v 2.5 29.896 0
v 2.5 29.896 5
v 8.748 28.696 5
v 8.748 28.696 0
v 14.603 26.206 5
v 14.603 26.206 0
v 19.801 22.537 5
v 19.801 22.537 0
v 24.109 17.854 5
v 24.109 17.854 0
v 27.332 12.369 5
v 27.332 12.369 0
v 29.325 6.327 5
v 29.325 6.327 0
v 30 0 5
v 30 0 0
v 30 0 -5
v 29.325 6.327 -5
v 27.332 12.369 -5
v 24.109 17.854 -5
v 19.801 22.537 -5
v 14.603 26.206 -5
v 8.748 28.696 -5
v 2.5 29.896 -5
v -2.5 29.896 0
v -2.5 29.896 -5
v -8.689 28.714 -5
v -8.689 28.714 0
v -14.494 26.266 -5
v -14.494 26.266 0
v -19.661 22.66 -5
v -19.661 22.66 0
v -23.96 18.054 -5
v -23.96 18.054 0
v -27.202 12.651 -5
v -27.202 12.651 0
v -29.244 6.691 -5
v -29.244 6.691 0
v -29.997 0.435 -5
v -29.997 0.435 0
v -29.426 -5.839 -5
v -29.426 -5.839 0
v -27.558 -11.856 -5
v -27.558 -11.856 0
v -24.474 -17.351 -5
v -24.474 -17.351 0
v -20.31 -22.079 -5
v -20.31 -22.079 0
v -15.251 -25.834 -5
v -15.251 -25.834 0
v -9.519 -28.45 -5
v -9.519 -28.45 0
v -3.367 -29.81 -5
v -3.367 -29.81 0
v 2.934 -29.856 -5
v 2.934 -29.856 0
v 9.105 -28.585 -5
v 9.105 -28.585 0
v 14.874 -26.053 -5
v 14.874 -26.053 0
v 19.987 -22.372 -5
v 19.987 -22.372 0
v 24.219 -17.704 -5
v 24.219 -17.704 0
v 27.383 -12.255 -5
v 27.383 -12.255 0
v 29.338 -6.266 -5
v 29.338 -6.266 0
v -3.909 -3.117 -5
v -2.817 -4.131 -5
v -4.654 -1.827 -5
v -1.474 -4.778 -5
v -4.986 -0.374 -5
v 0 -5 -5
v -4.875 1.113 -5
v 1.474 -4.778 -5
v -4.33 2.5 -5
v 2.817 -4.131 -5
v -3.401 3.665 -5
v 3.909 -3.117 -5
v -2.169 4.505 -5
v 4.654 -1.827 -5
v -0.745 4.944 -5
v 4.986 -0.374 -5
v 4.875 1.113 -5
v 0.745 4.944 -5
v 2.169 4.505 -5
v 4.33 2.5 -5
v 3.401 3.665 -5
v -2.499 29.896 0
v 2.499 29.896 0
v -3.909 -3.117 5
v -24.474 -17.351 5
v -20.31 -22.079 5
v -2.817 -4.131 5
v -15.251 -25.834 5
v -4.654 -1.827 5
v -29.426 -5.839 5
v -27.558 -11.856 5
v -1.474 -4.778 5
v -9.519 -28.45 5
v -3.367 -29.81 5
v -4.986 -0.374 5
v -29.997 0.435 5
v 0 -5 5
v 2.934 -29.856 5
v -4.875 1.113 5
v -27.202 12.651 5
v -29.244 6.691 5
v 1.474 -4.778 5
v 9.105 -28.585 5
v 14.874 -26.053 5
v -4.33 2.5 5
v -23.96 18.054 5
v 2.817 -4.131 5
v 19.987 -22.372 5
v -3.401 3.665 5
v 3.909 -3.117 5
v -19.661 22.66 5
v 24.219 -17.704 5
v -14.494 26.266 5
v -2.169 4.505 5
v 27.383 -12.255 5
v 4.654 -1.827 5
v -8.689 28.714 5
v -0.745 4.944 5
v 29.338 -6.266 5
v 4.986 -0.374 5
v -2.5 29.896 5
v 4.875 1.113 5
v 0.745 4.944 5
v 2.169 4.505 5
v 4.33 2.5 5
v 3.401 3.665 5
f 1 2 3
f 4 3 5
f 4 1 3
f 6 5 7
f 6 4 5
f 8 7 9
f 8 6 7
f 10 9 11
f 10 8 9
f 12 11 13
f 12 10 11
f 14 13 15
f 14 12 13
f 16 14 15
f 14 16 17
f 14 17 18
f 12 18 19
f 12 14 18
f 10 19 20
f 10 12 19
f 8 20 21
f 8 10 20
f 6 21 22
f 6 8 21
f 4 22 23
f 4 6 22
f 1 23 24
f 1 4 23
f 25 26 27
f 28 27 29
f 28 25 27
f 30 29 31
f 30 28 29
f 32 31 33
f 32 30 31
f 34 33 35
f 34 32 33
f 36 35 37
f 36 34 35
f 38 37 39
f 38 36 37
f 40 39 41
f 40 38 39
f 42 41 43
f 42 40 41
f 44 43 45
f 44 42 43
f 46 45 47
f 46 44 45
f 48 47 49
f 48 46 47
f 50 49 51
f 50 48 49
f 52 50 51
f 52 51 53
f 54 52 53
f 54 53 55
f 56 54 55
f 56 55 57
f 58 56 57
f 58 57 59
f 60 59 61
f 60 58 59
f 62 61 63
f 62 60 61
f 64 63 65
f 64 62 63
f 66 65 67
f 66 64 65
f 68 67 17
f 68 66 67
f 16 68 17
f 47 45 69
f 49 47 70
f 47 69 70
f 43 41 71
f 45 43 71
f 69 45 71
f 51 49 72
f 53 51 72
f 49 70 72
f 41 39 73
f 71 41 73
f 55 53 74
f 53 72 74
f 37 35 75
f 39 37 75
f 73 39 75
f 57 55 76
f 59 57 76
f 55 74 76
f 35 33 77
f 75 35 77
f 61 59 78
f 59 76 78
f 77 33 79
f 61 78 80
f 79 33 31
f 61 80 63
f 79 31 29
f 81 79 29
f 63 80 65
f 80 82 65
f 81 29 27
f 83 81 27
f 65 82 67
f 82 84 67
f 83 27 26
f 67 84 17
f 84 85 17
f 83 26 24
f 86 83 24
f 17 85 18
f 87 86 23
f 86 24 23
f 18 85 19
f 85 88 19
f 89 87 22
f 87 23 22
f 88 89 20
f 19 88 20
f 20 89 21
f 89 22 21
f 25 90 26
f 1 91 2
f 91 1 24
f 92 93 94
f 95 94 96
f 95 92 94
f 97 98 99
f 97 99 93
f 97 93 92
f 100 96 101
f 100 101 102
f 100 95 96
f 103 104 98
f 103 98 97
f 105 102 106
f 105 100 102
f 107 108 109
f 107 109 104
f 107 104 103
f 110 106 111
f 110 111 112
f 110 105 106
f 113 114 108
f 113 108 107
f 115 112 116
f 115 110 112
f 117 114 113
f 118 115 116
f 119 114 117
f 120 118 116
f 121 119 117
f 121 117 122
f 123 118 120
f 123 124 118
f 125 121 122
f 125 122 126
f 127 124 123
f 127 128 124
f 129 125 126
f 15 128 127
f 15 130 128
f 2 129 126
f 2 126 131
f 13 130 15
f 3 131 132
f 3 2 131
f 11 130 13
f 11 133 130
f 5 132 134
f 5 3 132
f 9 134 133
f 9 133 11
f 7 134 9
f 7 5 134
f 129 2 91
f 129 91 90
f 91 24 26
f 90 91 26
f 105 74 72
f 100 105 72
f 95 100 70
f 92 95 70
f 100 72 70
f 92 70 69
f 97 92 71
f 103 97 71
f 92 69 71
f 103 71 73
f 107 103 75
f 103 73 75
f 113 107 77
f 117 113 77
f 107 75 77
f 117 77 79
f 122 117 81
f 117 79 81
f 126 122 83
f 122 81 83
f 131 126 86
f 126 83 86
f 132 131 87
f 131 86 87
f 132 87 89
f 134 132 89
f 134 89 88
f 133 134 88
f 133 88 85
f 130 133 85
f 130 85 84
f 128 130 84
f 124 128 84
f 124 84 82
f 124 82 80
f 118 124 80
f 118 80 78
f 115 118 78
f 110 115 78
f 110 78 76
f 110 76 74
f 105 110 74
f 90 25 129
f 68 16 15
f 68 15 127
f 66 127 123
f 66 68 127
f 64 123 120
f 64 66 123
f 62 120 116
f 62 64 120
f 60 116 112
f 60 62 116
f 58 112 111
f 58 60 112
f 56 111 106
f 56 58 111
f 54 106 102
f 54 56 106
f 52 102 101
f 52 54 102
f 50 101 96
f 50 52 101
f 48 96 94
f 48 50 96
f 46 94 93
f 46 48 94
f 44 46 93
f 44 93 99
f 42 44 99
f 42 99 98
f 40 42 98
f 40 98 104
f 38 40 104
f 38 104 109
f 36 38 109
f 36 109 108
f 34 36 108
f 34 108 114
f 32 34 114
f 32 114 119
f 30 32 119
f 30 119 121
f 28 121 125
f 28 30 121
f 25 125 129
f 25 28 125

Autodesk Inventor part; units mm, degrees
ref_plane "YZ Plane" through (0, 0, 0) normal (1, 0, 0) x (0, 1, 0)
ref_plane "XZ Plane" through (0, 0, 0) normal (0, 1, 0) x (-1, 0, 0)
ref_plane "XY Plane" through (0, 0, 0) normal (0, 0, 1) x (1, 0, 0)
sketch "Sketch1" plane through (0, 0, 0) normal (0, 0, 1) x (1, 0, 0)
  circle A0 centre (0, 0) radius 30
  dimension "d2" = 60
extrude "Extrusion1" add sketch "Sketch1" along normal mid plane 10
sketch "Sketch2" plane through (0, 0, 0) normal (0, 0, 1) x (1, 0, 0)
  line L0 (2.5, 29.8957) -> (-2.5, 29.8957)
  circle A0 centre (0, 0) radius 30 projected
  line L1 (2.5, 30.9866) -> (-2.5, 30.9866)
  line L2 (-2.5, 30.9866) -> (-2.5, 29.8957)
  line L3 (2.5, 29.8957) -> (2.5, 30.9866)
  dimension "d3" = 5
extrude "Extrusion2" cut sketch "Sketch2" along normal mid plane 10 contours L0 A0 picked at (-0.2781, 29.9266)
sketch "Sketch3" plane through (0, 0, 5) normal (0, 0, 1) x (1, 0, 0)
  point P0 (0, 0)
  point P1 (0, 0)
hole "Hole1" at (0, 0, 5) direction (0, 0, -1) diameter 10 end through all
properties part number "pinion" material "Steel, High Strength, Low Alloy"
